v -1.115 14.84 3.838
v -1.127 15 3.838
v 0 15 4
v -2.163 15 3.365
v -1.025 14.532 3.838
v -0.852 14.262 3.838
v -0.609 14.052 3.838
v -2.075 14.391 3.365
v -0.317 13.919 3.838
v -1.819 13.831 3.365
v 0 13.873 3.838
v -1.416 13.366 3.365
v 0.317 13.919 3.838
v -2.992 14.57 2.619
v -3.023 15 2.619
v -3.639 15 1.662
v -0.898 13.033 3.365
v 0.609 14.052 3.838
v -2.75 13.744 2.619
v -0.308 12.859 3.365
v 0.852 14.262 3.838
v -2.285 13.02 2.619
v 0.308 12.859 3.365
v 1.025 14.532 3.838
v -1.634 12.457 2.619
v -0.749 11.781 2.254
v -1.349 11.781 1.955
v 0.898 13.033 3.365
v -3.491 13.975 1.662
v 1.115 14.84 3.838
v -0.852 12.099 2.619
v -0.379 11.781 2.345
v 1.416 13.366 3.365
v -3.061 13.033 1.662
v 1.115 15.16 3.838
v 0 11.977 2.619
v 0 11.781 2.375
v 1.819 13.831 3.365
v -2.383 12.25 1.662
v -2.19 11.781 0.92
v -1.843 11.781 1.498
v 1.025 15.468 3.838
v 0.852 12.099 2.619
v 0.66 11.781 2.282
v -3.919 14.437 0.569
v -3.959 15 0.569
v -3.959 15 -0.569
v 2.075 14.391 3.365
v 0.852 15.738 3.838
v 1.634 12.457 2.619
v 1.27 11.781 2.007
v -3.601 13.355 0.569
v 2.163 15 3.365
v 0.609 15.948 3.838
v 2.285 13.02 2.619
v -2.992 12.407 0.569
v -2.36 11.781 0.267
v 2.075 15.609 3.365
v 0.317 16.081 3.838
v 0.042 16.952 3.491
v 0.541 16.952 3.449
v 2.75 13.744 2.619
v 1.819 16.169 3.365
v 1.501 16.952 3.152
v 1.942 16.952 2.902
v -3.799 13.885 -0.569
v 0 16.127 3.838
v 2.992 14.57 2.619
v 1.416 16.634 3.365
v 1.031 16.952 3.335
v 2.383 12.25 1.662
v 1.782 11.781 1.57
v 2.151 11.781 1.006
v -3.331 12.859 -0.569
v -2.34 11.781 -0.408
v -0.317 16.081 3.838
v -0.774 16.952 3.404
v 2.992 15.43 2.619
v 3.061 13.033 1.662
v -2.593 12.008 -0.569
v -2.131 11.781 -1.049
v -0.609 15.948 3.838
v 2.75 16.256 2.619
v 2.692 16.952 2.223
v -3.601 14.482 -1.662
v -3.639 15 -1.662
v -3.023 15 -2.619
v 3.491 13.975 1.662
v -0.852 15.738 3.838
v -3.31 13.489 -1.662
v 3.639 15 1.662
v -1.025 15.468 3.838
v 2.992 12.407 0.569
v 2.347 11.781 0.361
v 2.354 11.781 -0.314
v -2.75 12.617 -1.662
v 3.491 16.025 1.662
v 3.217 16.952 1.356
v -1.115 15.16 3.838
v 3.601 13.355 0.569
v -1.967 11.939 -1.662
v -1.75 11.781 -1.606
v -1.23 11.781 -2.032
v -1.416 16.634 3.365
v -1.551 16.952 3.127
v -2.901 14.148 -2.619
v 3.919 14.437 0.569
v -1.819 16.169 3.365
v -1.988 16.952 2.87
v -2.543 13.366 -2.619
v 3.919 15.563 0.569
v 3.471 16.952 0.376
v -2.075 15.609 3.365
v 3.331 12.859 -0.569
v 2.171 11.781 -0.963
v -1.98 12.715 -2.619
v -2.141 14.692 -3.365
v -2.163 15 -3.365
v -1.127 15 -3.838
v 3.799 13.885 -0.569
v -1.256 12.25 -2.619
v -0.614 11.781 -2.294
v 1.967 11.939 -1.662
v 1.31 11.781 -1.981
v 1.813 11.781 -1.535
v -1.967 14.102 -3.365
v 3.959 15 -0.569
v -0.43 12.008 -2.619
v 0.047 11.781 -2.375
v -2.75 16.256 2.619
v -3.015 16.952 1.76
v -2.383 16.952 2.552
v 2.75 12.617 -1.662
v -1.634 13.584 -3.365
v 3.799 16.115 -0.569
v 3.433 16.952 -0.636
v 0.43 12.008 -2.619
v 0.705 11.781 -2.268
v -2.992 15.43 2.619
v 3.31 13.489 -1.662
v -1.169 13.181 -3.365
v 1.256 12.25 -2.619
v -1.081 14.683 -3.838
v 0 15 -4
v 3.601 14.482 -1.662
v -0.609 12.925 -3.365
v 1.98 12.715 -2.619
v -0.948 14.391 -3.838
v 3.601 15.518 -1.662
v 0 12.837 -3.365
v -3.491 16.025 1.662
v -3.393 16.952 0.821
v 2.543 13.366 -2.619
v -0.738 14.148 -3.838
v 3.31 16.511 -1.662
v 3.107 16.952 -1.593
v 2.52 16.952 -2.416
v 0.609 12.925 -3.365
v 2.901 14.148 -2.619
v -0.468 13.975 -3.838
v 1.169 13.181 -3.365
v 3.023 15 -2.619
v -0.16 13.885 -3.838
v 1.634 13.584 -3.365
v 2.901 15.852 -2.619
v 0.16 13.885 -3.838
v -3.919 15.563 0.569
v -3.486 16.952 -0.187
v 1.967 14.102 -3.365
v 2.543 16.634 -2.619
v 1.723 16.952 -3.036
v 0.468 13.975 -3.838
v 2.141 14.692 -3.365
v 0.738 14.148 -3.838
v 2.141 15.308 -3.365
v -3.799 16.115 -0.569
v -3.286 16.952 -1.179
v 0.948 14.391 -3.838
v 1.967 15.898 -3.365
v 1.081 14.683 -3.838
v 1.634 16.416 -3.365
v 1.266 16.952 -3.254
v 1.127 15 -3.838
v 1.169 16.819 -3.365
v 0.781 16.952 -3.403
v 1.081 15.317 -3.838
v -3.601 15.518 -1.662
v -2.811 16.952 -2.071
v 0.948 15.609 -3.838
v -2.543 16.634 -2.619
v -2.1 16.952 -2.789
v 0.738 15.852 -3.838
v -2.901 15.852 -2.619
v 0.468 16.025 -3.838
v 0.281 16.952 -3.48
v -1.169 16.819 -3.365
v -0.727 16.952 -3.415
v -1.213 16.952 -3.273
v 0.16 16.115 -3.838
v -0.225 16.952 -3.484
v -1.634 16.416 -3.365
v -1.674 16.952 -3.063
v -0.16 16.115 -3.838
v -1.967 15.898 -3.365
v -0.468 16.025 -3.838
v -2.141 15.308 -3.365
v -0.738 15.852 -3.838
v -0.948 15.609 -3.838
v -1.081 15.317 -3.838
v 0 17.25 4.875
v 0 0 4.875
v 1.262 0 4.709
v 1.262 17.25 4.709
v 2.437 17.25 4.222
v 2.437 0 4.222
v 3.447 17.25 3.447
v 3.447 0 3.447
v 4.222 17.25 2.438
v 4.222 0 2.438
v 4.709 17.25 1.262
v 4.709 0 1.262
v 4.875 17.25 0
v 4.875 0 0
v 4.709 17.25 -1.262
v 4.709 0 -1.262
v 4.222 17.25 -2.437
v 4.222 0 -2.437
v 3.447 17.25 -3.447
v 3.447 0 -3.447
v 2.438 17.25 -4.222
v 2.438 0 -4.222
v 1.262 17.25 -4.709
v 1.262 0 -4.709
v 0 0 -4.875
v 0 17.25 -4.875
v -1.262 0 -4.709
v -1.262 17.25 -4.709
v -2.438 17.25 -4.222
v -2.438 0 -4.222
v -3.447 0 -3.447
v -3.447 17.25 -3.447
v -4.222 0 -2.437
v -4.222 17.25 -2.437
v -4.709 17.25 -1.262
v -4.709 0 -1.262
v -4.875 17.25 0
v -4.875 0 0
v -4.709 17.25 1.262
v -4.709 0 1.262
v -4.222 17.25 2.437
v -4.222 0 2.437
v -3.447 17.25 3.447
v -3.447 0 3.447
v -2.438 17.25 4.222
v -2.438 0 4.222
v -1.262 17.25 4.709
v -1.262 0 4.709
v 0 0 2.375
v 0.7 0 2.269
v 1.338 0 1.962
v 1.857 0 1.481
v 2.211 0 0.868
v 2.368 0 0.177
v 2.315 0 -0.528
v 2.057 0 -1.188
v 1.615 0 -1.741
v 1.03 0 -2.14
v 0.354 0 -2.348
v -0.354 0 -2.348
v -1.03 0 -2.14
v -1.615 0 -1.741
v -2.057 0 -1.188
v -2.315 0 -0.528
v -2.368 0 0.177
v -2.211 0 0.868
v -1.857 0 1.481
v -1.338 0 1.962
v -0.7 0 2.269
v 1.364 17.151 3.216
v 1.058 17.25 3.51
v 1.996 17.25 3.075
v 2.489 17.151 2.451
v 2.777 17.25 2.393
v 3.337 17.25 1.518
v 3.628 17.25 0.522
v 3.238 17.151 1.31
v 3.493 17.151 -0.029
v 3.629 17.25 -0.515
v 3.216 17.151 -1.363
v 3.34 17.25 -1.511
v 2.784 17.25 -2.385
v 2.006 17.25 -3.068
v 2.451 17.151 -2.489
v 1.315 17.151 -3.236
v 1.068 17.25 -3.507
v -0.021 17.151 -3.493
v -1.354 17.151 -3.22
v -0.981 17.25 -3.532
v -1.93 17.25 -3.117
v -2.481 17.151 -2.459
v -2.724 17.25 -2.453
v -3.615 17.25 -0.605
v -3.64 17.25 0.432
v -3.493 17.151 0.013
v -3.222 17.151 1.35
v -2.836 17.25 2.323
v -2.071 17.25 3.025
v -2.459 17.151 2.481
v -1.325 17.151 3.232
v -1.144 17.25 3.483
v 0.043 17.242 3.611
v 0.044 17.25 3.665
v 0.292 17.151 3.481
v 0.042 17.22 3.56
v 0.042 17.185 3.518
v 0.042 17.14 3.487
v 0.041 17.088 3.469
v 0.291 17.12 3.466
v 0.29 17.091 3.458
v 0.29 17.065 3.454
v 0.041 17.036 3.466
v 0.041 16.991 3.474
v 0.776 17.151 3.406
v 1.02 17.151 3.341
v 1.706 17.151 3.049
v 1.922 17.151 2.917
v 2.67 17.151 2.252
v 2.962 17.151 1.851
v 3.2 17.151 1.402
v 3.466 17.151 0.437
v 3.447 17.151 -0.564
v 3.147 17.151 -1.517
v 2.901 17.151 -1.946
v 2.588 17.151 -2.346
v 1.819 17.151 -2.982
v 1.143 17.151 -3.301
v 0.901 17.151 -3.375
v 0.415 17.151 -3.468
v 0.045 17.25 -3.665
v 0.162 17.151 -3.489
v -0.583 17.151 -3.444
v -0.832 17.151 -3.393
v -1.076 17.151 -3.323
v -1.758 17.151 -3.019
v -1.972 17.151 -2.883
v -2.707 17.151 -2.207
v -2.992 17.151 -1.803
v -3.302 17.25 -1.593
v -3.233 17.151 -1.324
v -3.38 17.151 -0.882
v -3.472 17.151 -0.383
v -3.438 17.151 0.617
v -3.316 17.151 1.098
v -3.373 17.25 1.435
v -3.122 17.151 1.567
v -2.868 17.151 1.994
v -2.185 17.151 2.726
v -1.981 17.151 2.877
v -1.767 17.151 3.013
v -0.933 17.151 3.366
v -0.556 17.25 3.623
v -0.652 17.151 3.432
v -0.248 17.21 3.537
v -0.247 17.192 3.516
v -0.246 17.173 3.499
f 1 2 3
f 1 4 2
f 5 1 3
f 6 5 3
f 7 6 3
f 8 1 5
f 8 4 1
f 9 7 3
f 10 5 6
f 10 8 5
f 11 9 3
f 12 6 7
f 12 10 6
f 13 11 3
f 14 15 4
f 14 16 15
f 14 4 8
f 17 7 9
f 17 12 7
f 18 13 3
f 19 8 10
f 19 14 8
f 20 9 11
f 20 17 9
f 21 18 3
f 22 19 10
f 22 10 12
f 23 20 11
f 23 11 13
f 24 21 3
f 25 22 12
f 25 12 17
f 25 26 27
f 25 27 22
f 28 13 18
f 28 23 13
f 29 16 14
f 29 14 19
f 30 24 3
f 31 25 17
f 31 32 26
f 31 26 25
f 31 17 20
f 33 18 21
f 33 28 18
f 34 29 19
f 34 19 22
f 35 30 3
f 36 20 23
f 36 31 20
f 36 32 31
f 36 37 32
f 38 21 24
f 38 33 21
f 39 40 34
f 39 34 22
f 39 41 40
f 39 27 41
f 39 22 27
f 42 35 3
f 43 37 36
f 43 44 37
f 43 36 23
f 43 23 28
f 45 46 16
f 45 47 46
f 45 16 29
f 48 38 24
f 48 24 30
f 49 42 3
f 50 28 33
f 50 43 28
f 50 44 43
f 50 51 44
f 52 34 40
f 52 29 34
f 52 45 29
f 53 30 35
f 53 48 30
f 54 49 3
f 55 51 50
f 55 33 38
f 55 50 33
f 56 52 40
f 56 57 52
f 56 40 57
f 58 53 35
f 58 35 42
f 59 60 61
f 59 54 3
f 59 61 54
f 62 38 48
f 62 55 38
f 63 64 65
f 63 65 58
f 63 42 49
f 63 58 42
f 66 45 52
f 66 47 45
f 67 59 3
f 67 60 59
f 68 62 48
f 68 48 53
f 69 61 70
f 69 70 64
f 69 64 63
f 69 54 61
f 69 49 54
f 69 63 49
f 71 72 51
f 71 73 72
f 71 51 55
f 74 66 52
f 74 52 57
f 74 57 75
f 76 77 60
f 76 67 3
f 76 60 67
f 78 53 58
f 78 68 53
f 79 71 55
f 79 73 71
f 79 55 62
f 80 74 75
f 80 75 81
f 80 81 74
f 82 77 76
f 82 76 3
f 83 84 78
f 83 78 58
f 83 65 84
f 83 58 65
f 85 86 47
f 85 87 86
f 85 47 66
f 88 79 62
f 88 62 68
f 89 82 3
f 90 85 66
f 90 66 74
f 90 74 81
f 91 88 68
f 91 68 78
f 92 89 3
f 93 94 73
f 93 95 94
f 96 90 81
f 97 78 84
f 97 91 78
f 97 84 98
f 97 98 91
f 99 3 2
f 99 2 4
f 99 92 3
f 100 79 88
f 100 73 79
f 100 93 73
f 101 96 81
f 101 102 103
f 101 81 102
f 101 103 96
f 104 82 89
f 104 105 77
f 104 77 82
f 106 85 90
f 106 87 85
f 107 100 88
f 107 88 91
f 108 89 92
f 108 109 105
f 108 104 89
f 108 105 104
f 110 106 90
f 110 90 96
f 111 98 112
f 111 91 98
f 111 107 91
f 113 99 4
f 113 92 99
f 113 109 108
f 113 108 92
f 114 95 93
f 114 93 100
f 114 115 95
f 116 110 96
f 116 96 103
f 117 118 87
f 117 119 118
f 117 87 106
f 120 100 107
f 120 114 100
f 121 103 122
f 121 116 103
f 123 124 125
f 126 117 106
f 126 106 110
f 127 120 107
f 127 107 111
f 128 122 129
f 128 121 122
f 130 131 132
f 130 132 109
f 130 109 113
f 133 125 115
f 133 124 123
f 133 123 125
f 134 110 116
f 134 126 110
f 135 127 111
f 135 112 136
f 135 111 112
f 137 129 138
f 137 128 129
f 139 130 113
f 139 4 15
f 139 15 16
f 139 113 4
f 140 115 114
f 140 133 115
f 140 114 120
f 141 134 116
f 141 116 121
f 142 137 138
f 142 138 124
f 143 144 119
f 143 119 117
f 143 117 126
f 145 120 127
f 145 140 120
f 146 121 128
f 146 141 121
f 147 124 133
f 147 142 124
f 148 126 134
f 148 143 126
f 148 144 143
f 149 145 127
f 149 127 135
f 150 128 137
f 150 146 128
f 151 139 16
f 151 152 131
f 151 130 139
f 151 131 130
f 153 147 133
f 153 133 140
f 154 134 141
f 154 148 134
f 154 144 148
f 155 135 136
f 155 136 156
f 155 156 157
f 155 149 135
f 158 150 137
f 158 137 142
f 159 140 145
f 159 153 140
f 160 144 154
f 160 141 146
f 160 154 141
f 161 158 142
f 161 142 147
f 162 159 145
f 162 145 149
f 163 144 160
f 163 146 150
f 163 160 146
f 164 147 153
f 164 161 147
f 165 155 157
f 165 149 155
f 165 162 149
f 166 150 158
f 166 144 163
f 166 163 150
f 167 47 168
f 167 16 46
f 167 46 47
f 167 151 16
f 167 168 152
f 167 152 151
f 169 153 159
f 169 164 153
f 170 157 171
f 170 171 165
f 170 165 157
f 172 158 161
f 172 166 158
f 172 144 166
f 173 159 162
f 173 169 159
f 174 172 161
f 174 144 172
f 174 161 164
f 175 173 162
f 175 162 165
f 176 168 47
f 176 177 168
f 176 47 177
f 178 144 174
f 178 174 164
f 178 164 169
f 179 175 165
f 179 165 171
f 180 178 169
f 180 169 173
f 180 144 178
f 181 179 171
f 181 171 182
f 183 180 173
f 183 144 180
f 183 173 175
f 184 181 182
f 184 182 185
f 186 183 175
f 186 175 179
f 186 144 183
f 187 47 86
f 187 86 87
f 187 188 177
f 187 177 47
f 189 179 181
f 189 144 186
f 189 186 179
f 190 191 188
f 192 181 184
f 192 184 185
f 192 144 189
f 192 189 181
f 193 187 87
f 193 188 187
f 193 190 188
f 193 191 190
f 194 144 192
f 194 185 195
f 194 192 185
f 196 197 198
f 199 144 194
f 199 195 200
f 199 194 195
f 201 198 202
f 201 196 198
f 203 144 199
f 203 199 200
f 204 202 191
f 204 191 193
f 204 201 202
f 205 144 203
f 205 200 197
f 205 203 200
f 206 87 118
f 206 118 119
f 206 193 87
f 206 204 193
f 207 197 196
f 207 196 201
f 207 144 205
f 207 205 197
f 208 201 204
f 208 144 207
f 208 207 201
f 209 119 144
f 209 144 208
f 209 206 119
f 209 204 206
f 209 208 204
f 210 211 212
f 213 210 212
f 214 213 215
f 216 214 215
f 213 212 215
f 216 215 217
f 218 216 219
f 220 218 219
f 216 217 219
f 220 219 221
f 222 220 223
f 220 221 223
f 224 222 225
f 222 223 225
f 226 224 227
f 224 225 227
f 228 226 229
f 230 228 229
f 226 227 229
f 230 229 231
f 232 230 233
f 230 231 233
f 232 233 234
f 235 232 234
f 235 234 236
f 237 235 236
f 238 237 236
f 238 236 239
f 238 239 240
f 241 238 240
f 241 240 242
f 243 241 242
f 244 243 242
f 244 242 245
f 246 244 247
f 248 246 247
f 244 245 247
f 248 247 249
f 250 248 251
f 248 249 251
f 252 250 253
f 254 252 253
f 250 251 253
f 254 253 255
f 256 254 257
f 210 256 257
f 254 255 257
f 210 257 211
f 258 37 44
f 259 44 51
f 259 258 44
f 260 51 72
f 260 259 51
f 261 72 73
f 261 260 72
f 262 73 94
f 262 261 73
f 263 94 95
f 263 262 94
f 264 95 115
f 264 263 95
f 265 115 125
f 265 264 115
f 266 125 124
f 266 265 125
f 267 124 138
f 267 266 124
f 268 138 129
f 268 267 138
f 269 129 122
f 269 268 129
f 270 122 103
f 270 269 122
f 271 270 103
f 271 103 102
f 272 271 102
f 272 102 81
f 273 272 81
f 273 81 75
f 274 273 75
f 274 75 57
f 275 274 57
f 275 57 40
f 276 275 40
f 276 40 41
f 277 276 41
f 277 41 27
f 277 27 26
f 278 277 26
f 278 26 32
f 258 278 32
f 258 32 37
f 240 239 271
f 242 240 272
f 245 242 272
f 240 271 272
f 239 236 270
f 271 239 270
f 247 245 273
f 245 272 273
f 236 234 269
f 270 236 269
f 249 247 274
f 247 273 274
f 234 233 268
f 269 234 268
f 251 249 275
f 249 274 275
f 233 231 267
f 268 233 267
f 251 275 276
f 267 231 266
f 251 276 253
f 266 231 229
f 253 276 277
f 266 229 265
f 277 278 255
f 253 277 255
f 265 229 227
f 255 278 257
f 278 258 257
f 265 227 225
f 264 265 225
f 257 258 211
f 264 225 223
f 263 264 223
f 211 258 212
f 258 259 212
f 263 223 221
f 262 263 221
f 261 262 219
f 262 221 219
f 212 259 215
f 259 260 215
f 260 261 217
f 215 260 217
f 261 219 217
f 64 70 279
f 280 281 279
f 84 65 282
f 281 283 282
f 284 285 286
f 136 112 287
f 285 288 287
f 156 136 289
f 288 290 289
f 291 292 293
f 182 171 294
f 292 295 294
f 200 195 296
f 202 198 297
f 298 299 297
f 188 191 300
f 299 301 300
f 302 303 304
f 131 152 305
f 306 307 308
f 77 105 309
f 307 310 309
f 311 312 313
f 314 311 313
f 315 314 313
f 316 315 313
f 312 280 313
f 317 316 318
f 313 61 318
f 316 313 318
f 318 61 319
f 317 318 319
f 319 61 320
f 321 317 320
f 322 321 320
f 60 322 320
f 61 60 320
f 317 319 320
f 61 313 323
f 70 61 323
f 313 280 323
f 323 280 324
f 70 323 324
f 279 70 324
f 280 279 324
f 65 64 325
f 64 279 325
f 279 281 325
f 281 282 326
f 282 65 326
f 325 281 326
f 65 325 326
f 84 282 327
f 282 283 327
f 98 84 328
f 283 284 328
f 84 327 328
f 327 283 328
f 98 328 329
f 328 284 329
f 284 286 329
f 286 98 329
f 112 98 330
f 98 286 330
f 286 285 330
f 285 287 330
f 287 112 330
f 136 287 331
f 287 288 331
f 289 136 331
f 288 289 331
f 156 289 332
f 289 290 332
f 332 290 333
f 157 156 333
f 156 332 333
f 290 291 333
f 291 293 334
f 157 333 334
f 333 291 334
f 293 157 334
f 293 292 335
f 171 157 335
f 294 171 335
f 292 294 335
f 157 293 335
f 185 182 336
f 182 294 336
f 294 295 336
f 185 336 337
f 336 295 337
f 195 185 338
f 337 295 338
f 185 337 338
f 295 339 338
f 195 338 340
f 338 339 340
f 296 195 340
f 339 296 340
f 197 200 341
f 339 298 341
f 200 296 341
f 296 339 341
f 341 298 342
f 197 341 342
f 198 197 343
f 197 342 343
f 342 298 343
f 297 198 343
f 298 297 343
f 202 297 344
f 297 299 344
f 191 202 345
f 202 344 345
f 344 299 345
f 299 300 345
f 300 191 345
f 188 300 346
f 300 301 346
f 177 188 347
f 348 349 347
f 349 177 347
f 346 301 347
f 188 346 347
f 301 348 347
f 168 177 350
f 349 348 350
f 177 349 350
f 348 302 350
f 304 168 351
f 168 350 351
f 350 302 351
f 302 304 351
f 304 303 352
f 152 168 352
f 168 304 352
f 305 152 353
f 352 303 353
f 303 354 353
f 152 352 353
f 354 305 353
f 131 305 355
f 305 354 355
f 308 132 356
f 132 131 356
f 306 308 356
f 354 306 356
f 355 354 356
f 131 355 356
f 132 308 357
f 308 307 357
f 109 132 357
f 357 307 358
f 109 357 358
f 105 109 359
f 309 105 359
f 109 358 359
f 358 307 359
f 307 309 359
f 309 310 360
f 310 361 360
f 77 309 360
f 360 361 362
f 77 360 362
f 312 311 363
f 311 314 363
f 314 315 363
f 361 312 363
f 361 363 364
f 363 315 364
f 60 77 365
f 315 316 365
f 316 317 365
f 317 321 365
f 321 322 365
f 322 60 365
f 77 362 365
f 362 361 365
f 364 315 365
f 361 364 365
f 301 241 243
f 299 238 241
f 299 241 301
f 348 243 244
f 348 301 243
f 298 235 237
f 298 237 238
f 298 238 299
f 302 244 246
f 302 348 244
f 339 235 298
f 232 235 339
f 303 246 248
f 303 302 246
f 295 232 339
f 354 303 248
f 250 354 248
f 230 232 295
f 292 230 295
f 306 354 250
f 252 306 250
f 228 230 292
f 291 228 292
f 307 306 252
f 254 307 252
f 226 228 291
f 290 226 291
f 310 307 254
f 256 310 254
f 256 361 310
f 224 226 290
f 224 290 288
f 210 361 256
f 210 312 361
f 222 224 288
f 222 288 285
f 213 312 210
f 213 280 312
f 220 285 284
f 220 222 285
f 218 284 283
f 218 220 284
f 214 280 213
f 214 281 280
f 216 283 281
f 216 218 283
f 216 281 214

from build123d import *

# Parameters (mm, degrees)
SKETCH1_R           = 4.875
SKETCH1_R_2         = 2.375
BOSS_EXTRUDE1_DEPTH = 17.25
FILLET1_R           = 0.2


with BuildPart() as part:
    # Sketch1 → Boss-Extrude1 (new body)
    with BuildSketch(Plane(origin=(0, 0, 0), x_dir=(1, 0, 0), z_dir=(0, 1, 0))):
        with Locations(Location((0, 0, 0), (0, 0, 270))):
            Circle(SKETCH1_R)
        with Locations(Location((0, 0, 0), (0, 0, 270))):
            Circle(SKETCH1_R_2, mode=Mode.SUBTRACT)
    extrude(amount=BOSS_EXTRUDE1_DEPTH)

    # Sketch3 → Cut-Revolve3 (revolve, cut)
    with BuildSketch(Plane(origin=(0, 15, 0), x_dir=(-1, 0, 0), z_dir=(0, -1, 0))):
        with BuildLine():
            Line((0, 4), (0, -4))
            ThreePointArc((0, -4), (4, 0), (0, 4))
        make_face()
    revolve(axis=Axis((0, 15, -5.147727802), (0, 0, 1)), mode=Mode.SUBTRACT)

    # Fillet1
    fillet1_edges = [part.edges().sort_by_distance(p)[0] for p in [
        (0, 17.25, -3.307189139),
    ]]
    fillet(fillet1_edges, radius=FILLET1_R)


solid = part.part
